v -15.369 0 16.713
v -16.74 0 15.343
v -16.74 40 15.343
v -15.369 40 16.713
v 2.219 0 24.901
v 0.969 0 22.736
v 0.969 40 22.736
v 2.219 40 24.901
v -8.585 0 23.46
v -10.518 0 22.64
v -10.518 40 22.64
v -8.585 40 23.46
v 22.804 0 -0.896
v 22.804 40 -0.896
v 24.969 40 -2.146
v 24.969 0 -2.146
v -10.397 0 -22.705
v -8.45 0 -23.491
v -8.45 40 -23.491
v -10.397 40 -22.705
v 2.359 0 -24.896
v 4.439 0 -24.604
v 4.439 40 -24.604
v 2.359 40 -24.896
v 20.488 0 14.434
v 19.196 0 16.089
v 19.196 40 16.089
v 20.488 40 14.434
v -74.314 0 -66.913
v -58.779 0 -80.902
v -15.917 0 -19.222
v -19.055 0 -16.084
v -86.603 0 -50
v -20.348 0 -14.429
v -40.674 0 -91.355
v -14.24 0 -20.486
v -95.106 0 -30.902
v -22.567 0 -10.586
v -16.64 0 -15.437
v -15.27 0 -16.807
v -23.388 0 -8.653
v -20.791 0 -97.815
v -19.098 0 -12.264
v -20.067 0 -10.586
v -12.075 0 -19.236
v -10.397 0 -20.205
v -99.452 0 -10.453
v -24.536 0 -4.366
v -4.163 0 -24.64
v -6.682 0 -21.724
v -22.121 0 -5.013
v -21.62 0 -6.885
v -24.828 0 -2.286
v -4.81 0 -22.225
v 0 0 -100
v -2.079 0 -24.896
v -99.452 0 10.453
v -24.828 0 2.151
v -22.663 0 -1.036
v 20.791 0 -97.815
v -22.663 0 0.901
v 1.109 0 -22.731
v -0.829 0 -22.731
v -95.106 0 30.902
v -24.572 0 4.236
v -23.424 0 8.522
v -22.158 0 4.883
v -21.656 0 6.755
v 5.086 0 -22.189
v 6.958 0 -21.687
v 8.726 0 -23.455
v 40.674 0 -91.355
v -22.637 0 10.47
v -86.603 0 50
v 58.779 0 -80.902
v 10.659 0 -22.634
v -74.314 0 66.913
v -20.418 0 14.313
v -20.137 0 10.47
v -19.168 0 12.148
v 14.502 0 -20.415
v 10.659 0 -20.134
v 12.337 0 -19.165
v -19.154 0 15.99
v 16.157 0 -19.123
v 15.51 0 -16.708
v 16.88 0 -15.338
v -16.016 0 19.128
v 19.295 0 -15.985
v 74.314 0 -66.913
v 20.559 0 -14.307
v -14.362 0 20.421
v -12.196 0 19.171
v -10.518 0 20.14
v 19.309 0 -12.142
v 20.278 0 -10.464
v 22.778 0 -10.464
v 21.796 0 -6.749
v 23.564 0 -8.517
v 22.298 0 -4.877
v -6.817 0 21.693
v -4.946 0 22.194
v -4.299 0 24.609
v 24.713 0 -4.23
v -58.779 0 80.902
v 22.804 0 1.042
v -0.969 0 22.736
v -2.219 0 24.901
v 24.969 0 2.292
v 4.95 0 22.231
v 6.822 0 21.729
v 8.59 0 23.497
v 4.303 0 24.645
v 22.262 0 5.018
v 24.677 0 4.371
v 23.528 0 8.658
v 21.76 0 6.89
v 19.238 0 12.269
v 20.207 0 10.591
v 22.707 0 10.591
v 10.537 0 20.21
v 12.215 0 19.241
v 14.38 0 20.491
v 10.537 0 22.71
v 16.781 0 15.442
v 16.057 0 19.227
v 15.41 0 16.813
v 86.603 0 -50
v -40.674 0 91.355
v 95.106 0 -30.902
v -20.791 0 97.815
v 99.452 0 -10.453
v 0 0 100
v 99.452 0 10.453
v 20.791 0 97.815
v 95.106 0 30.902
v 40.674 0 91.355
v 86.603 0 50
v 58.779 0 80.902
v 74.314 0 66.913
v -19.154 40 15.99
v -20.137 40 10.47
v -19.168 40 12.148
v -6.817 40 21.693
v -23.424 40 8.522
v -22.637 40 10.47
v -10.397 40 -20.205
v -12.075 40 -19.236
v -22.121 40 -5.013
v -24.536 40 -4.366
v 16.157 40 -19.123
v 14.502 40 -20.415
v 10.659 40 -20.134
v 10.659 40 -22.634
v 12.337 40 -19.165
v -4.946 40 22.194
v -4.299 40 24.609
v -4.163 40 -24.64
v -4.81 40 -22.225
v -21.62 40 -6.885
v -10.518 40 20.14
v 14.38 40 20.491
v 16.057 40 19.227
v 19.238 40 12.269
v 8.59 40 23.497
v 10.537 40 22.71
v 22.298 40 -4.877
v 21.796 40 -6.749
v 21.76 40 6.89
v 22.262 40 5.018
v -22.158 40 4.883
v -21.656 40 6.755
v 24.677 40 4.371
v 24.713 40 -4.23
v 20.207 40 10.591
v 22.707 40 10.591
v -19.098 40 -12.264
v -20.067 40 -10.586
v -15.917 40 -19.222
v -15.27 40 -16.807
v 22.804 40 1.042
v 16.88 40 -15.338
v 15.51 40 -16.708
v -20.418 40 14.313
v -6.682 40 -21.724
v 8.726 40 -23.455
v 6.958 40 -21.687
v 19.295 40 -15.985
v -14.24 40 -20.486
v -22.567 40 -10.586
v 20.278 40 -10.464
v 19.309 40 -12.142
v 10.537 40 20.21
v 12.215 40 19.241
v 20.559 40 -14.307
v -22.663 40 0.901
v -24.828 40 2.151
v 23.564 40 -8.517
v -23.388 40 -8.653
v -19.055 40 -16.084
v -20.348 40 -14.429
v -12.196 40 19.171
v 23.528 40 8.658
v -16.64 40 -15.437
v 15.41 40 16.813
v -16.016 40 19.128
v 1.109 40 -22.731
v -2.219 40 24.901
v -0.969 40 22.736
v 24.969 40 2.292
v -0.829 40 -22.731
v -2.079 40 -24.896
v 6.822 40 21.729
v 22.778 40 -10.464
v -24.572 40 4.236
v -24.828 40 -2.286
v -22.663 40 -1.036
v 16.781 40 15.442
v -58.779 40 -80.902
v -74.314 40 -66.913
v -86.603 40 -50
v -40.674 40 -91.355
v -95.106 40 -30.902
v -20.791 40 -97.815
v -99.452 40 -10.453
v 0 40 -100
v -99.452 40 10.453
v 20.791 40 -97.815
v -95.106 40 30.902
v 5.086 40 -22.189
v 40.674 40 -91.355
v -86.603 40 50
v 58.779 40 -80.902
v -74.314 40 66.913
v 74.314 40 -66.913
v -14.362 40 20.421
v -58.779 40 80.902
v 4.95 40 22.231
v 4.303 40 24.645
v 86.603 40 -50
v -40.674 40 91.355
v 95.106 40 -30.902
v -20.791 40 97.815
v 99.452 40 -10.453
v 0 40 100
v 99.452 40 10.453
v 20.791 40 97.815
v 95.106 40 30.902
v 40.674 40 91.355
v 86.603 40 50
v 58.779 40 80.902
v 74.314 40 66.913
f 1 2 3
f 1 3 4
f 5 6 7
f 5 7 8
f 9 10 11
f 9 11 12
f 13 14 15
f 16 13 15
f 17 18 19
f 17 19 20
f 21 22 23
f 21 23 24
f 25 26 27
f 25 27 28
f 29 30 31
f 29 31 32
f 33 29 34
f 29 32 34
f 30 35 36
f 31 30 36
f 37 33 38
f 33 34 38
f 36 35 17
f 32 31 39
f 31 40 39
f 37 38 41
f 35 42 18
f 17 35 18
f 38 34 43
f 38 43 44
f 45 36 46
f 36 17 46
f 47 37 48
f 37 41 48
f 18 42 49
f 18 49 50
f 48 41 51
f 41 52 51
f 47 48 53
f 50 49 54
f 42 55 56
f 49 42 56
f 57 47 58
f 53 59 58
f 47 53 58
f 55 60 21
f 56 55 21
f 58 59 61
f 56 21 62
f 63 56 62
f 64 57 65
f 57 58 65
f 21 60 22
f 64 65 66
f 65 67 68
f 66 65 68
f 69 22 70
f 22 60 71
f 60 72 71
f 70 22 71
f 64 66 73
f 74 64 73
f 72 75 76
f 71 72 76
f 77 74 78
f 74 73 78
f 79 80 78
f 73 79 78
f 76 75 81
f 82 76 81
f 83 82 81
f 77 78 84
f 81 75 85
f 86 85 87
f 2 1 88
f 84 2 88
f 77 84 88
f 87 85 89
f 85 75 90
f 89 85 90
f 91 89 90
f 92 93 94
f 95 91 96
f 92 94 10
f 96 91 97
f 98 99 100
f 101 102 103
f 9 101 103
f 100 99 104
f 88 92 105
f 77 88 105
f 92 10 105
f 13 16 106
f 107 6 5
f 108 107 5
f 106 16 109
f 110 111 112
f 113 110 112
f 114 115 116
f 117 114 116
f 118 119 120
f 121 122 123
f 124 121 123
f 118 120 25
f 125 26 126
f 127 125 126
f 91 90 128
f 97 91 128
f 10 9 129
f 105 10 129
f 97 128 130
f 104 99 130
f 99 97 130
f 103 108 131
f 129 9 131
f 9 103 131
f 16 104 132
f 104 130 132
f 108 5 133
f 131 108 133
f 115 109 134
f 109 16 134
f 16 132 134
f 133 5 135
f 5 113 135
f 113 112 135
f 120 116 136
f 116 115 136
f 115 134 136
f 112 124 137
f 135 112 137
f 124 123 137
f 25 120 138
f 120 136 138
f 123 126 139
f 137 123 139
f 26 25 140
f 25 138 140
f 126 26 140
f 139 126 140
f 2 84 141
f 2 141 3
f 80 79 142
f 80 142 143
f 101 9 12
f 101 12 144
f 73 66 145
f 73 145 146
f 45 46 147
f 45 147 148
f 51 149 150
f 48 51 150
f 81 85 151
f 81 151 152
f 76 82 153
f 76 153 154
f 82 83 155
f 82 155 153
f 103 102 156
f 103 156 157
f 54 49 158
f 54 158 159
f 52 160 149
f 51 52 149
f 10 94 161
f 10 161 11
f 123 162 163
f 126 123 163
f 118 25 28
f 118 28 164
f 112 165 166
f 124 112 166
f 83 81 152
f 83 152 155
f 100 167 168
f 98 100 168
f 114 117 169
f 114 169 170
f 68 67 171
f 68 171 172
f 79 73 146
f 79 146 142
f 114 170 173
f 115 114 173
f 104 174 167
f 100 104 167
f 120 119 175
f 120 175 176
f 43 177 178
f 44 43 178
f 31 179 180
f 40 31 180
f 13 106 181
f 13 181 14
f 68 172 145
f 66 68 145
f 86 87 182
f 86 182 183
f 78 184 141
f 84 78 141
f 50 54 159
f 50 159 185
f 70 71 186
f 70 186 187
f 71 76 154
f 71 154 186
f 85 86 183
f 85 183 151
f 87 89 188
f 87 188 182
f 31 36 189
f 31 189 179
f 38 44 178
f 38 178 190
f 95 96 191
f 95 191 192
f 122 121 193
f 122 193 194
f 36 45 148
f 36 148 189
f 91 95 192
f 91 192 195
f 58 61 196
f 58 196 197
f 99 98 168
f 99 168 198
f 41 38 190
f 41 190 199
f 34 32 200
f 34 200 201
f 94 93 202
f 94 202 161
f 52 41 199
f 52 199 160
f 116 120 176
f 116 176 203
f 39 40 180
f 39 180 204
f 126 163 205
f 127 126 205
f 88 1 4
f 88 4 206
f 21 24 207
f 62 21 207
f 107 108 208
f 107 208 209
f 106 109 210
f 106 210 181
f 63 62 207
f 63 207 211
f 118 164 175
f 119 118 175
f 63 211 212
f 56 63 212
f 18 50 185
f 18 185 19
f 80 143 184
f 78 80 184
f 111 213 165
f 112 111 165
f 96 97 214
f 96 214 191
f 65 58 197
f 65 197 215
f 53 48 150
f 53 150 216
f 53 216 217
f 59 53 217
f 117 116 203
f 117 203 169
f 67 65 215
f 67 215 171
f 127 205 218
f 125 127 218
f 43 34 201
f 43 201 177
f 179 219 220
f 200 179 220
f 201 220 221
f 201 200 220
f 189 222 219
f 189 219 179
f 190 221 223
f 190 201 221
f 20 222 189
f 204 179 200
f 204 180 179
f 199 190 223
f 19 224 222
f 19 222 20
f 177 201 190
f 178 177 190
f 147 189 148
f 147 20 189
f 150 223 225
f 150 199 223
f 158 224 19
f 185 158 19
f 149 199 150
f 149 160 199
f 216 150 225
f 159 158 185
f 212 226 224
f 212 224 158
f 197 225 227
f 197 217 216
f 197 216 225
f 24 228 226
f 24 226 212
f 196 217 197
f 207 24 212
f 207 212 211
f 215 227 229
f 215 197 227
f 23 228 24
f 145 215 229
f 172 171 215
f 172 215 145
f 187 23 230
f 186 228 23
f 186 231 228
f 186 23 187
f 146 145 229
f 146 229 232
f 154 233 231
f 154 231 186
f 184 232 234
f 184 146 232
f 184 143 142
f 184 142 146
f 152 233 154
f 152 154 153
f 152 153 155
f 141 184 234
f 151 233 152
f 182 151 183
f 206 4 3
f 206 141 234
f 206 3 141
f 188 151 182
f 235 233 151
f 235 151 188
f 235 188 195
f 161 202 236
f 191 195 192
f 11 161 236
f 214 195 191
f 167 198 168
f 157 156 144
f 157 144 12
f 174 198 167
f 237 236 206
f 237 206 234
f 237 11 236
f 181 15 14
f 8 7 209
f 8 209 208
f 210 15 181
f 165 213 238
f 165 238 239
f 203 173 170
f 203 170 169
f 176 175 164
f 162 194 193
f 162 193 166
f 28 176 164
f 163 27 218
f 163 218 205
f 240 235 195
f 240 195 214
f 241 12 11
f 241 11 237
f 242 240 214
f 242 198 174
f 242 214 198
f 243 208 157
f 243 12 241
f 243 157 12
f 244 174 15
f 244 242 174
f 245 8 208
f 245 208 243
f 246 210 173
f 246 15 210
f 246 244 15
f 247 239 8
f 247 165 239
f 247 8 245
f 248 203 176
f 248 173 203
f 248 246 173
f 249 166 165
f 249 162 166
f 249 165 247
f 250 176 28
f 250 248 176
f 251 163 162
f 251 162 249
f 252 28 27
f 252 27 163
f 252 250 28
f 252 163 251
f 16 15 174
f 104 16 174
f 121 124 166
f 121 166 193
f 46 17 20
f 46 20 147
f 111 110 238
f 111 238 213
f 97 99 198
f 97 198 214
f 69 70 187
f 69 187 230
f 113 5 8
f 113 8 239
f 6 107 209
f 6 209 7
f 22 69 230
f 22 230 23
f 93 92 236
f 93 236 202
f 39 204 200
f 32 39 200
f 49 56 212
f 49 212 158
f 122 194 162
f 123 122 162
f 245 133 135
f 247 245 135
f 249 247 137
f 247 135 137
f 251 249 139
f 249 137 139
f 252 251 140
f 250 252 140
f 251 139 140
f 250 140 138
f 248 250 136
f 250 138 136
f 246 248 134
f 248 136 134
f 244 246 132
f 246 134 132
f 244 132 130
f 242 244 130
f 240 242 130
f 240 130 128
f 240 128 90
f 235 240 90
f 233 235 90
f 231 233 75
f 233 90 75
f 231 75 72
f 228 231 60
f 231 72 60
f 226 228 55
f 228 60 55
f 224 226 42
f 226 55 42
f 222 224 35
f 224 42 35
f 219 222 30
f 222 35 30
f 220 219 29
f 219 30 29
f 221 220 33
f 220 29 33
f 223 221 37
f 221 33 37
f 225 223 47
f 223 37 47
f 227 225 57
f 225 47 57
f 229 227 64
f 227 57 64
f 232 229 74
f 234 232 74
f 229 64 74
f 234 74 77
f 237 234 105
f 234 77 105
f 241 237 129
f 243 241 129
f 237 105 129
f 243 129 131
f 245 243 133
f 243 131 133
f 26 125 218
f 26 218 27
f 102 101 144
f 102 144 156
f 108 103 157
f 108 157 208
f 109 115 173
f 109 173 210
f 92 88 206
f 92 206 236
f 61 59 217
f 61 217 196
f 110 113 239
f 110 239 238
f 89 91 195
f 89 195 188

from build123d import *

# Parameters (mm, degrees)
SKETCH8_R           = 100
BOSS_EXTRUDE4_DEPTH = 40
CUT_EXTRUDE1_DEPTH  = 147.969384567


with BuildPart() as part:
    # Sketch8 → Boss-Extrude4 (new body)
    with BuildSketch(Plane(origin=(0, 0, 0), x_dir=(1, 0, 0), z_dir=(0, 1, 0))):
        with Locations(Location((0, 0, 0), (0, 0, 270))):
            Circle(SKETCH8_R)
    extrude(amount=BOSS_EXTRUDE4_DEPTH)

    # Sketch6 → Cut-Extrude1 (cut, through all)
    with BuildSketch(Plane(origin=(0, 0, 0), x_dir=(1, 0, 0), z_dir=(0, 1, 0))):
        Polygon((-0.9689411, -22.736267788), (0.9689411, -22.736267788), (2.2189411, -24.901331298), (4.303288018, -24.645405677), (4.950335631, -22.230591111), (6.822186096, -21.72903029), (8.589953049, -23.496797243), (10.537039143, -22.710123397), (10.537039143, -20.210123397), (12.215294358, -19.241182297), (14.380357867, -20.491182297), (16.057492438, -19.227370749), (15.410444825, -16.812556183), (16.78073447, -15.442266539), (19.195549035, -16.089314151), (20.488438134, -14.434491569), (19.238438134, -12.269428059), (20.207379233, -10.591172845), (22.707379233, -10.591172845), (23.527914603, -8.658112653), (21.76014765, -6.8903457), (22.261708471, -5.018495235), (24.676523036, -4.371447622), (24.968786548, -2.291884678), (22.803723039, -1.041884678), (22.803723039, 0.895997521), (24.968786548, 2.145997521), (24.712860927, 4.23034444), (22.298046362, 4.877392053), (21.796485541, 6.749242517), (23.564252494, 8.51700947), (22.777578648, 10.464095565), (20.277578648, 10.464095565), (19.308637548, 12.142350779), (20.558637548, 14.307414289), (19.294826, 15.98454886), (16.880011434, 15.337501247), (15.509721789, 16.707790891), (16.156769402, 19.122605457), (14.50194682, 20.415494555), (12.33688331, 19.165494555), (10.658628096, 20.134435655), (10.658628096, 22.634435655), (8.725567904, 23.454971025), (6.957800951, 21.687204072), (5.085950486, 22.188764892), (4.438902873, 24.603579458), (2.359339929, 24.89584297), (1.109339929, 22.730779461), (-0.828542271, 22.730779461), (-2.078542271, 24.89584297), (-4.162889189, 24.639917349), (-4.809936802, 22.225102783), (-6.681787267, 21.723541963), (-8.44955422, 23.491308916), (-10.396640314, 22.70463507), (-10.396640314, 20.20463507), (-12.074895529, 19.23569397), (-14.239959038, 20.48569397), (-15.917093609, 19.221882421), (-15.270045996, 16.807067856), (-16.640335641, 15.436778211), (-19.055150206, 16.083825824), (-20.348039305, 14.429003241), (-19.098039305, 12.263939732), (-20.066980404, 10.585684518), (-22.566980404, 10.585684518), (-23.387515774, 8.652624325), (-21.619748821, 6.884857372), (-22.121309642, 5.013006908), (-24.536124207, 4.365959295), (-24.828387719, 2.28639635), (-22.66332421, 1.03639635), (-22.66332421, -0.901485849), (-24.828387719, -2.151485849), (-24.572462098, -4.235832767), (-22.157647532, -4.88288038), (-21.656086712, -6.754730845), (-23.423853665, -8.522497798), (-22.637179819, -10.469583893), (-20.137179819, -10.469583893), (-19.168238719, -12.147839107), (-20.418238719, -14.312902616), (-19.154427171, -15.990037187), (-16.739612605, -15.342989575), (-15.36932296, -16.713279219), (-16.016370573, -19.128093785), (-14.361547991, -20.420982883), (-12.196484481, -19.170982883), (-10.518229267, -20.139923983), (-10.518229267, -22.639923983), (-8.585169075, -23.460459352), (-6.817402122, -21.6926924), (-4.945551657, -22.19425322), (-4.298504044, -24.609067786), (-2.2189411, -24.901331298), align=None)
    extrude(amount=CUT_EXTRUDE1_DEPTH, mode=Mode.SUBTRACT)


solid = part.part
